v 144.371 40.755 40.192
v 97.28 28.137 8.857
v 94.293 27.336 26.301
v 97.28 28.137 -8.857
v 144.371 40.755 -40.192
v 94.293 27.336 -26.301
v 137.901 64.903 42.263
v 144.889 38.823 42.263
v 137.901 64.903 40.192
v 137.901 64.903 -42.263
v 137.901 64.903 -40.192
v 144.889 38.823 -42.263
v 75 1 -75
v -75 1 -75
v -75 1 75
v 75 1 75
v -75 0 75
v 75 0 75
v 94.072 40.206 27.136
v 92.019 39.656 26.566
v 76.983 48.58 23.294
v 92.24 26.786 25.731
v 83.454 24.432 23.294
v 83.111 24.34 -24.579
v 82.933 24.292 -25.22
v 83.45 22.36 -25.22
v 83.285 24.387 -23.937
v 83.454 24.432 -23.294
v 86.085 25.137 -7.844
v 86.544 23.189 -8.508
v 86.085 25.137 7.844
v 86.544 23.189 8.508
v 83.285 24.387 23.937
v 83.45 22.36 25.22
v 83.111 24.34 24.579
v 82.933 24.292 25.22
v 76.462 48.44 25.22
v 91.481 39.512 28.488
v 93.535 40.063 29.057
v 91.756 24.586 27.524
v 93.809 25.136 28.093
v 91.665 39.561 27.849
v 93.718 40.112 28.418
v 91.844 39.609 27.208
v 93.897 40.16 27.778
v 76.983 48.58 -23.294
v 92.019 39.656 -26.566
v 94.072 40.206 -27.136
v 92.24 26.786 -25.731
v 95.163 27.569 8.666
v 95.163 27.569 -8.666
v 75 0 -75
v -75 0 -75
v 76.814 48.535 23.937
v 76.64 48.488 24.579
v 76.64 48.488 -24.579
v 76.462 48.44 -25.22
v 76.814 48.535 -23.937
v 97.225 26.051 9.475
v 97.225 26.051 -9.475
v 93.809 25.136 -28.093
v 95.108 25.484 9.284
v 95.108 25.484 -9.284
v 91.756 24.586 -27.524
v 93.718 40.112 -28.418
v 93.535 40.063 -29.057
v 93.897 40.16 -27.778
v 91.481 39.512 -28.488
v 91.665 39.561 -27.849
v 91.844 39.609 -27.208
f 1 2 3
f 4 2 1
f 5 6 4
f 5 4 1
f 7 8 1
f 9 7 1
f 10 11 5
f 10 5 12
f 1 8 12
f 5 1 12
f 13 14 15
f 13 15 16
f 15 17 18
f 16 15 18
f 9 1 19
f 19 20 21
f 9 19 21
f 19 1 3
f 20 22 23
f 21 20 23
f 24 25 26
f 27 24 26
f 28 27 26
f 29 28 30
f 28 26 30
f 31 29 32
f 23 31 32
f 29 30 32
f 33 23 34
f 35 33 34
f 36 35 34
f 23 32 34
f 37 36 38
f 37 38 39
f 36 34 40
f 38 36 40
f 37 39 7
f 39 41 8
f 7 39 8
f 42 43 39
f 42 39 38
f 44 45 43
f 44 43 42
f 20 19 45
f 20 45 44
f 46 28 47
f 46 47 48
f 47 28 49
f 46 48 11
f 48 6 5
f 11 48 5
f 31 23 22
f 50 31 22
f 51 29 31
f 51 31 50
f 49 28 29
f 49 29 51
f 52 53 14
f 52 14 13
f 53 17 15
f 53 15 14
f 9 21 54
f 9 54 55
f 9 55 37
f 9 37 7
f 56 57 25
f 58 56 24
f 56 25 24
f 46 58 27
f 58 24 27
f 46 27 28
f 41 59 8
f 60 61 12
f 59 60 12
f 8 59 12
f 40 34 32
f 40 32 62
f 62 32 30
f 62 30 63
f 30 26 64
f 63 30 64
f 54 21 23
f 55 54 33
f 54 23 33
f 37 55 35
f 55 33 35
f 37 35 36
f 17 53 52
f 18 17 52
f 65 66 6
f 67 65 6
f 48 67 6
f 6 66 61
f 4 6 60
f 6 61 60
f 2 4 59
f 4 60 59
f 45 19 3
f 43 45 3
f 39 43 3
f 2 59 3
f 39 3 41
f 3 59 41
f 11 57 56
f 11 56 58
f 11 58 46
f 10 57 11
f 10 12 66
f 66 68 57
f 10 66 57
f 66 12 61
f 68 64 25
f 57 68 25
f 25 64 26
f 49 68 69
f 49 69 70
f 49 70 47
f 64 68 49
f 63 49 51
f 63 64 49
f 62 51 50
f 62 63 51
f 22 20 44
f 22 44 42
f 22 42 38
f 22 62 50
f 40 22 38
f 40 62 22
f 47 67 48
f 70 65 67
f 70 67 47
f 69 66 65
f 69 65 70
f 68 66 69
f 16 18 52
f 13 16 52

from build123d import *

# Parameters (mm, degrees)
SKETCH4_W           = 150
SKETCH4_H           = 150
BOSS_EXTRUDE4_DEPTH = 1
BOSS_EXTRUDE5_DEPTH = 2
BOSS_EXTRUDE6_START = 2
BOSS_EXTRUDE6_DEPTH = 25
SKETCH8_R           = 101.1
SKETCH8_R_2         = 98.9
CUT_EXTRUDE4_DEPTH  = 15


with BuildPart() as part:
    # Sketch4 → Boss-Extrude4 (new body)
    with BuildSketch(Plane(origin=(0, 0, 0), x_dir=(1, 0, 0), z_dir=(0, 1, 0))):
        Rectangle(SKETCH4_W, SKETCH4_H)
    extrude(amount=BOSS_EXTRUDE4_DEPTH)


with BuildPart() as body_2:
    # Sketch1 → Boss-Extrude5 (new body)
    with BuildSketch(Plane(origin=(0, 0, 0), x_dir=(0.9659258262890681, 0.25881904510252135, 0), z_dir=(-0.25881904510252135, 0.9659258262890681, 0))):
        with BuildLine():
            ThreePointArc((86.394218607, 25.219813467), (90, 0), (86.394218607, -25.219813467))
            Line((86.394218607, -25.219813467), (150, -42.262931225))
            Line((150, -42.262931225), (150, 42.262931225))
            Line((150, 42.262931225), (86.394218607, 25.219813467))
        make_face()
    extrude(amount=BOSS_EXTRUDE5_DEPTH)

    # Sketch1<7> → Boss-Extrude6 (add)
    with BuildSketch(Plane(origin=(0, 0, 0), x_dir=(0.9659258262890681, 0.25881904510252135, 0), z_dir=(-0.25881904510252135, 0.9659258262890681, 0)).offset(BOSS_EXTRUDE6_START)):
        with BuildLine():
            ThreePointArc((86.394218607, 25.219813467), (86.669122258, 24.258261418), (86.933324366, 23.293714059))
            Line((86.933324366, 23.293714059), (150, 40.192378865))
            Line((150, 40.192378865), (150, 42.262931225))
            Line((150, 42.262931225), (86.394218607, 25.219813467))
        make_face()
        with BuildLine():
            ThreePointArc((86.933324366, -23.293714059), (86.669122258, -24.258261418), (86.394218607, -25.219813467))
            Line((86.394218607, -25.219813467), (150, -42.262931225))
            Line((150, -42.262931225), (150, -40.192378865))
            Line((150, -40.192378865), (86.933324366, -23.293714059))
        make_face()
    extrude(amount=BOSS_EXTRUDE6_DEPTH)

    # Sketch8 → Cut-Extrude4 (cut, along a direction that is not the sketch's normal)
    with BuildSketch(Plane(origin=(0, 0, 0), x_dir=(-0.9659258262890681, -0.25881904510252135, 0), z_dir=(0.25881904510252135, -0.9659258262890681, 0))):
        Circle(SKETCH8_R)
        Circle(SKETCH8_R_2, mode=Mode.SUBTRACT)
    extrude(amount=-CUT_EXTRUDE4_DEPTH, dir=(0, -1, 0), mode=Mode.SUBTRACT)


solid = Compound([part.part, body_2.part])
